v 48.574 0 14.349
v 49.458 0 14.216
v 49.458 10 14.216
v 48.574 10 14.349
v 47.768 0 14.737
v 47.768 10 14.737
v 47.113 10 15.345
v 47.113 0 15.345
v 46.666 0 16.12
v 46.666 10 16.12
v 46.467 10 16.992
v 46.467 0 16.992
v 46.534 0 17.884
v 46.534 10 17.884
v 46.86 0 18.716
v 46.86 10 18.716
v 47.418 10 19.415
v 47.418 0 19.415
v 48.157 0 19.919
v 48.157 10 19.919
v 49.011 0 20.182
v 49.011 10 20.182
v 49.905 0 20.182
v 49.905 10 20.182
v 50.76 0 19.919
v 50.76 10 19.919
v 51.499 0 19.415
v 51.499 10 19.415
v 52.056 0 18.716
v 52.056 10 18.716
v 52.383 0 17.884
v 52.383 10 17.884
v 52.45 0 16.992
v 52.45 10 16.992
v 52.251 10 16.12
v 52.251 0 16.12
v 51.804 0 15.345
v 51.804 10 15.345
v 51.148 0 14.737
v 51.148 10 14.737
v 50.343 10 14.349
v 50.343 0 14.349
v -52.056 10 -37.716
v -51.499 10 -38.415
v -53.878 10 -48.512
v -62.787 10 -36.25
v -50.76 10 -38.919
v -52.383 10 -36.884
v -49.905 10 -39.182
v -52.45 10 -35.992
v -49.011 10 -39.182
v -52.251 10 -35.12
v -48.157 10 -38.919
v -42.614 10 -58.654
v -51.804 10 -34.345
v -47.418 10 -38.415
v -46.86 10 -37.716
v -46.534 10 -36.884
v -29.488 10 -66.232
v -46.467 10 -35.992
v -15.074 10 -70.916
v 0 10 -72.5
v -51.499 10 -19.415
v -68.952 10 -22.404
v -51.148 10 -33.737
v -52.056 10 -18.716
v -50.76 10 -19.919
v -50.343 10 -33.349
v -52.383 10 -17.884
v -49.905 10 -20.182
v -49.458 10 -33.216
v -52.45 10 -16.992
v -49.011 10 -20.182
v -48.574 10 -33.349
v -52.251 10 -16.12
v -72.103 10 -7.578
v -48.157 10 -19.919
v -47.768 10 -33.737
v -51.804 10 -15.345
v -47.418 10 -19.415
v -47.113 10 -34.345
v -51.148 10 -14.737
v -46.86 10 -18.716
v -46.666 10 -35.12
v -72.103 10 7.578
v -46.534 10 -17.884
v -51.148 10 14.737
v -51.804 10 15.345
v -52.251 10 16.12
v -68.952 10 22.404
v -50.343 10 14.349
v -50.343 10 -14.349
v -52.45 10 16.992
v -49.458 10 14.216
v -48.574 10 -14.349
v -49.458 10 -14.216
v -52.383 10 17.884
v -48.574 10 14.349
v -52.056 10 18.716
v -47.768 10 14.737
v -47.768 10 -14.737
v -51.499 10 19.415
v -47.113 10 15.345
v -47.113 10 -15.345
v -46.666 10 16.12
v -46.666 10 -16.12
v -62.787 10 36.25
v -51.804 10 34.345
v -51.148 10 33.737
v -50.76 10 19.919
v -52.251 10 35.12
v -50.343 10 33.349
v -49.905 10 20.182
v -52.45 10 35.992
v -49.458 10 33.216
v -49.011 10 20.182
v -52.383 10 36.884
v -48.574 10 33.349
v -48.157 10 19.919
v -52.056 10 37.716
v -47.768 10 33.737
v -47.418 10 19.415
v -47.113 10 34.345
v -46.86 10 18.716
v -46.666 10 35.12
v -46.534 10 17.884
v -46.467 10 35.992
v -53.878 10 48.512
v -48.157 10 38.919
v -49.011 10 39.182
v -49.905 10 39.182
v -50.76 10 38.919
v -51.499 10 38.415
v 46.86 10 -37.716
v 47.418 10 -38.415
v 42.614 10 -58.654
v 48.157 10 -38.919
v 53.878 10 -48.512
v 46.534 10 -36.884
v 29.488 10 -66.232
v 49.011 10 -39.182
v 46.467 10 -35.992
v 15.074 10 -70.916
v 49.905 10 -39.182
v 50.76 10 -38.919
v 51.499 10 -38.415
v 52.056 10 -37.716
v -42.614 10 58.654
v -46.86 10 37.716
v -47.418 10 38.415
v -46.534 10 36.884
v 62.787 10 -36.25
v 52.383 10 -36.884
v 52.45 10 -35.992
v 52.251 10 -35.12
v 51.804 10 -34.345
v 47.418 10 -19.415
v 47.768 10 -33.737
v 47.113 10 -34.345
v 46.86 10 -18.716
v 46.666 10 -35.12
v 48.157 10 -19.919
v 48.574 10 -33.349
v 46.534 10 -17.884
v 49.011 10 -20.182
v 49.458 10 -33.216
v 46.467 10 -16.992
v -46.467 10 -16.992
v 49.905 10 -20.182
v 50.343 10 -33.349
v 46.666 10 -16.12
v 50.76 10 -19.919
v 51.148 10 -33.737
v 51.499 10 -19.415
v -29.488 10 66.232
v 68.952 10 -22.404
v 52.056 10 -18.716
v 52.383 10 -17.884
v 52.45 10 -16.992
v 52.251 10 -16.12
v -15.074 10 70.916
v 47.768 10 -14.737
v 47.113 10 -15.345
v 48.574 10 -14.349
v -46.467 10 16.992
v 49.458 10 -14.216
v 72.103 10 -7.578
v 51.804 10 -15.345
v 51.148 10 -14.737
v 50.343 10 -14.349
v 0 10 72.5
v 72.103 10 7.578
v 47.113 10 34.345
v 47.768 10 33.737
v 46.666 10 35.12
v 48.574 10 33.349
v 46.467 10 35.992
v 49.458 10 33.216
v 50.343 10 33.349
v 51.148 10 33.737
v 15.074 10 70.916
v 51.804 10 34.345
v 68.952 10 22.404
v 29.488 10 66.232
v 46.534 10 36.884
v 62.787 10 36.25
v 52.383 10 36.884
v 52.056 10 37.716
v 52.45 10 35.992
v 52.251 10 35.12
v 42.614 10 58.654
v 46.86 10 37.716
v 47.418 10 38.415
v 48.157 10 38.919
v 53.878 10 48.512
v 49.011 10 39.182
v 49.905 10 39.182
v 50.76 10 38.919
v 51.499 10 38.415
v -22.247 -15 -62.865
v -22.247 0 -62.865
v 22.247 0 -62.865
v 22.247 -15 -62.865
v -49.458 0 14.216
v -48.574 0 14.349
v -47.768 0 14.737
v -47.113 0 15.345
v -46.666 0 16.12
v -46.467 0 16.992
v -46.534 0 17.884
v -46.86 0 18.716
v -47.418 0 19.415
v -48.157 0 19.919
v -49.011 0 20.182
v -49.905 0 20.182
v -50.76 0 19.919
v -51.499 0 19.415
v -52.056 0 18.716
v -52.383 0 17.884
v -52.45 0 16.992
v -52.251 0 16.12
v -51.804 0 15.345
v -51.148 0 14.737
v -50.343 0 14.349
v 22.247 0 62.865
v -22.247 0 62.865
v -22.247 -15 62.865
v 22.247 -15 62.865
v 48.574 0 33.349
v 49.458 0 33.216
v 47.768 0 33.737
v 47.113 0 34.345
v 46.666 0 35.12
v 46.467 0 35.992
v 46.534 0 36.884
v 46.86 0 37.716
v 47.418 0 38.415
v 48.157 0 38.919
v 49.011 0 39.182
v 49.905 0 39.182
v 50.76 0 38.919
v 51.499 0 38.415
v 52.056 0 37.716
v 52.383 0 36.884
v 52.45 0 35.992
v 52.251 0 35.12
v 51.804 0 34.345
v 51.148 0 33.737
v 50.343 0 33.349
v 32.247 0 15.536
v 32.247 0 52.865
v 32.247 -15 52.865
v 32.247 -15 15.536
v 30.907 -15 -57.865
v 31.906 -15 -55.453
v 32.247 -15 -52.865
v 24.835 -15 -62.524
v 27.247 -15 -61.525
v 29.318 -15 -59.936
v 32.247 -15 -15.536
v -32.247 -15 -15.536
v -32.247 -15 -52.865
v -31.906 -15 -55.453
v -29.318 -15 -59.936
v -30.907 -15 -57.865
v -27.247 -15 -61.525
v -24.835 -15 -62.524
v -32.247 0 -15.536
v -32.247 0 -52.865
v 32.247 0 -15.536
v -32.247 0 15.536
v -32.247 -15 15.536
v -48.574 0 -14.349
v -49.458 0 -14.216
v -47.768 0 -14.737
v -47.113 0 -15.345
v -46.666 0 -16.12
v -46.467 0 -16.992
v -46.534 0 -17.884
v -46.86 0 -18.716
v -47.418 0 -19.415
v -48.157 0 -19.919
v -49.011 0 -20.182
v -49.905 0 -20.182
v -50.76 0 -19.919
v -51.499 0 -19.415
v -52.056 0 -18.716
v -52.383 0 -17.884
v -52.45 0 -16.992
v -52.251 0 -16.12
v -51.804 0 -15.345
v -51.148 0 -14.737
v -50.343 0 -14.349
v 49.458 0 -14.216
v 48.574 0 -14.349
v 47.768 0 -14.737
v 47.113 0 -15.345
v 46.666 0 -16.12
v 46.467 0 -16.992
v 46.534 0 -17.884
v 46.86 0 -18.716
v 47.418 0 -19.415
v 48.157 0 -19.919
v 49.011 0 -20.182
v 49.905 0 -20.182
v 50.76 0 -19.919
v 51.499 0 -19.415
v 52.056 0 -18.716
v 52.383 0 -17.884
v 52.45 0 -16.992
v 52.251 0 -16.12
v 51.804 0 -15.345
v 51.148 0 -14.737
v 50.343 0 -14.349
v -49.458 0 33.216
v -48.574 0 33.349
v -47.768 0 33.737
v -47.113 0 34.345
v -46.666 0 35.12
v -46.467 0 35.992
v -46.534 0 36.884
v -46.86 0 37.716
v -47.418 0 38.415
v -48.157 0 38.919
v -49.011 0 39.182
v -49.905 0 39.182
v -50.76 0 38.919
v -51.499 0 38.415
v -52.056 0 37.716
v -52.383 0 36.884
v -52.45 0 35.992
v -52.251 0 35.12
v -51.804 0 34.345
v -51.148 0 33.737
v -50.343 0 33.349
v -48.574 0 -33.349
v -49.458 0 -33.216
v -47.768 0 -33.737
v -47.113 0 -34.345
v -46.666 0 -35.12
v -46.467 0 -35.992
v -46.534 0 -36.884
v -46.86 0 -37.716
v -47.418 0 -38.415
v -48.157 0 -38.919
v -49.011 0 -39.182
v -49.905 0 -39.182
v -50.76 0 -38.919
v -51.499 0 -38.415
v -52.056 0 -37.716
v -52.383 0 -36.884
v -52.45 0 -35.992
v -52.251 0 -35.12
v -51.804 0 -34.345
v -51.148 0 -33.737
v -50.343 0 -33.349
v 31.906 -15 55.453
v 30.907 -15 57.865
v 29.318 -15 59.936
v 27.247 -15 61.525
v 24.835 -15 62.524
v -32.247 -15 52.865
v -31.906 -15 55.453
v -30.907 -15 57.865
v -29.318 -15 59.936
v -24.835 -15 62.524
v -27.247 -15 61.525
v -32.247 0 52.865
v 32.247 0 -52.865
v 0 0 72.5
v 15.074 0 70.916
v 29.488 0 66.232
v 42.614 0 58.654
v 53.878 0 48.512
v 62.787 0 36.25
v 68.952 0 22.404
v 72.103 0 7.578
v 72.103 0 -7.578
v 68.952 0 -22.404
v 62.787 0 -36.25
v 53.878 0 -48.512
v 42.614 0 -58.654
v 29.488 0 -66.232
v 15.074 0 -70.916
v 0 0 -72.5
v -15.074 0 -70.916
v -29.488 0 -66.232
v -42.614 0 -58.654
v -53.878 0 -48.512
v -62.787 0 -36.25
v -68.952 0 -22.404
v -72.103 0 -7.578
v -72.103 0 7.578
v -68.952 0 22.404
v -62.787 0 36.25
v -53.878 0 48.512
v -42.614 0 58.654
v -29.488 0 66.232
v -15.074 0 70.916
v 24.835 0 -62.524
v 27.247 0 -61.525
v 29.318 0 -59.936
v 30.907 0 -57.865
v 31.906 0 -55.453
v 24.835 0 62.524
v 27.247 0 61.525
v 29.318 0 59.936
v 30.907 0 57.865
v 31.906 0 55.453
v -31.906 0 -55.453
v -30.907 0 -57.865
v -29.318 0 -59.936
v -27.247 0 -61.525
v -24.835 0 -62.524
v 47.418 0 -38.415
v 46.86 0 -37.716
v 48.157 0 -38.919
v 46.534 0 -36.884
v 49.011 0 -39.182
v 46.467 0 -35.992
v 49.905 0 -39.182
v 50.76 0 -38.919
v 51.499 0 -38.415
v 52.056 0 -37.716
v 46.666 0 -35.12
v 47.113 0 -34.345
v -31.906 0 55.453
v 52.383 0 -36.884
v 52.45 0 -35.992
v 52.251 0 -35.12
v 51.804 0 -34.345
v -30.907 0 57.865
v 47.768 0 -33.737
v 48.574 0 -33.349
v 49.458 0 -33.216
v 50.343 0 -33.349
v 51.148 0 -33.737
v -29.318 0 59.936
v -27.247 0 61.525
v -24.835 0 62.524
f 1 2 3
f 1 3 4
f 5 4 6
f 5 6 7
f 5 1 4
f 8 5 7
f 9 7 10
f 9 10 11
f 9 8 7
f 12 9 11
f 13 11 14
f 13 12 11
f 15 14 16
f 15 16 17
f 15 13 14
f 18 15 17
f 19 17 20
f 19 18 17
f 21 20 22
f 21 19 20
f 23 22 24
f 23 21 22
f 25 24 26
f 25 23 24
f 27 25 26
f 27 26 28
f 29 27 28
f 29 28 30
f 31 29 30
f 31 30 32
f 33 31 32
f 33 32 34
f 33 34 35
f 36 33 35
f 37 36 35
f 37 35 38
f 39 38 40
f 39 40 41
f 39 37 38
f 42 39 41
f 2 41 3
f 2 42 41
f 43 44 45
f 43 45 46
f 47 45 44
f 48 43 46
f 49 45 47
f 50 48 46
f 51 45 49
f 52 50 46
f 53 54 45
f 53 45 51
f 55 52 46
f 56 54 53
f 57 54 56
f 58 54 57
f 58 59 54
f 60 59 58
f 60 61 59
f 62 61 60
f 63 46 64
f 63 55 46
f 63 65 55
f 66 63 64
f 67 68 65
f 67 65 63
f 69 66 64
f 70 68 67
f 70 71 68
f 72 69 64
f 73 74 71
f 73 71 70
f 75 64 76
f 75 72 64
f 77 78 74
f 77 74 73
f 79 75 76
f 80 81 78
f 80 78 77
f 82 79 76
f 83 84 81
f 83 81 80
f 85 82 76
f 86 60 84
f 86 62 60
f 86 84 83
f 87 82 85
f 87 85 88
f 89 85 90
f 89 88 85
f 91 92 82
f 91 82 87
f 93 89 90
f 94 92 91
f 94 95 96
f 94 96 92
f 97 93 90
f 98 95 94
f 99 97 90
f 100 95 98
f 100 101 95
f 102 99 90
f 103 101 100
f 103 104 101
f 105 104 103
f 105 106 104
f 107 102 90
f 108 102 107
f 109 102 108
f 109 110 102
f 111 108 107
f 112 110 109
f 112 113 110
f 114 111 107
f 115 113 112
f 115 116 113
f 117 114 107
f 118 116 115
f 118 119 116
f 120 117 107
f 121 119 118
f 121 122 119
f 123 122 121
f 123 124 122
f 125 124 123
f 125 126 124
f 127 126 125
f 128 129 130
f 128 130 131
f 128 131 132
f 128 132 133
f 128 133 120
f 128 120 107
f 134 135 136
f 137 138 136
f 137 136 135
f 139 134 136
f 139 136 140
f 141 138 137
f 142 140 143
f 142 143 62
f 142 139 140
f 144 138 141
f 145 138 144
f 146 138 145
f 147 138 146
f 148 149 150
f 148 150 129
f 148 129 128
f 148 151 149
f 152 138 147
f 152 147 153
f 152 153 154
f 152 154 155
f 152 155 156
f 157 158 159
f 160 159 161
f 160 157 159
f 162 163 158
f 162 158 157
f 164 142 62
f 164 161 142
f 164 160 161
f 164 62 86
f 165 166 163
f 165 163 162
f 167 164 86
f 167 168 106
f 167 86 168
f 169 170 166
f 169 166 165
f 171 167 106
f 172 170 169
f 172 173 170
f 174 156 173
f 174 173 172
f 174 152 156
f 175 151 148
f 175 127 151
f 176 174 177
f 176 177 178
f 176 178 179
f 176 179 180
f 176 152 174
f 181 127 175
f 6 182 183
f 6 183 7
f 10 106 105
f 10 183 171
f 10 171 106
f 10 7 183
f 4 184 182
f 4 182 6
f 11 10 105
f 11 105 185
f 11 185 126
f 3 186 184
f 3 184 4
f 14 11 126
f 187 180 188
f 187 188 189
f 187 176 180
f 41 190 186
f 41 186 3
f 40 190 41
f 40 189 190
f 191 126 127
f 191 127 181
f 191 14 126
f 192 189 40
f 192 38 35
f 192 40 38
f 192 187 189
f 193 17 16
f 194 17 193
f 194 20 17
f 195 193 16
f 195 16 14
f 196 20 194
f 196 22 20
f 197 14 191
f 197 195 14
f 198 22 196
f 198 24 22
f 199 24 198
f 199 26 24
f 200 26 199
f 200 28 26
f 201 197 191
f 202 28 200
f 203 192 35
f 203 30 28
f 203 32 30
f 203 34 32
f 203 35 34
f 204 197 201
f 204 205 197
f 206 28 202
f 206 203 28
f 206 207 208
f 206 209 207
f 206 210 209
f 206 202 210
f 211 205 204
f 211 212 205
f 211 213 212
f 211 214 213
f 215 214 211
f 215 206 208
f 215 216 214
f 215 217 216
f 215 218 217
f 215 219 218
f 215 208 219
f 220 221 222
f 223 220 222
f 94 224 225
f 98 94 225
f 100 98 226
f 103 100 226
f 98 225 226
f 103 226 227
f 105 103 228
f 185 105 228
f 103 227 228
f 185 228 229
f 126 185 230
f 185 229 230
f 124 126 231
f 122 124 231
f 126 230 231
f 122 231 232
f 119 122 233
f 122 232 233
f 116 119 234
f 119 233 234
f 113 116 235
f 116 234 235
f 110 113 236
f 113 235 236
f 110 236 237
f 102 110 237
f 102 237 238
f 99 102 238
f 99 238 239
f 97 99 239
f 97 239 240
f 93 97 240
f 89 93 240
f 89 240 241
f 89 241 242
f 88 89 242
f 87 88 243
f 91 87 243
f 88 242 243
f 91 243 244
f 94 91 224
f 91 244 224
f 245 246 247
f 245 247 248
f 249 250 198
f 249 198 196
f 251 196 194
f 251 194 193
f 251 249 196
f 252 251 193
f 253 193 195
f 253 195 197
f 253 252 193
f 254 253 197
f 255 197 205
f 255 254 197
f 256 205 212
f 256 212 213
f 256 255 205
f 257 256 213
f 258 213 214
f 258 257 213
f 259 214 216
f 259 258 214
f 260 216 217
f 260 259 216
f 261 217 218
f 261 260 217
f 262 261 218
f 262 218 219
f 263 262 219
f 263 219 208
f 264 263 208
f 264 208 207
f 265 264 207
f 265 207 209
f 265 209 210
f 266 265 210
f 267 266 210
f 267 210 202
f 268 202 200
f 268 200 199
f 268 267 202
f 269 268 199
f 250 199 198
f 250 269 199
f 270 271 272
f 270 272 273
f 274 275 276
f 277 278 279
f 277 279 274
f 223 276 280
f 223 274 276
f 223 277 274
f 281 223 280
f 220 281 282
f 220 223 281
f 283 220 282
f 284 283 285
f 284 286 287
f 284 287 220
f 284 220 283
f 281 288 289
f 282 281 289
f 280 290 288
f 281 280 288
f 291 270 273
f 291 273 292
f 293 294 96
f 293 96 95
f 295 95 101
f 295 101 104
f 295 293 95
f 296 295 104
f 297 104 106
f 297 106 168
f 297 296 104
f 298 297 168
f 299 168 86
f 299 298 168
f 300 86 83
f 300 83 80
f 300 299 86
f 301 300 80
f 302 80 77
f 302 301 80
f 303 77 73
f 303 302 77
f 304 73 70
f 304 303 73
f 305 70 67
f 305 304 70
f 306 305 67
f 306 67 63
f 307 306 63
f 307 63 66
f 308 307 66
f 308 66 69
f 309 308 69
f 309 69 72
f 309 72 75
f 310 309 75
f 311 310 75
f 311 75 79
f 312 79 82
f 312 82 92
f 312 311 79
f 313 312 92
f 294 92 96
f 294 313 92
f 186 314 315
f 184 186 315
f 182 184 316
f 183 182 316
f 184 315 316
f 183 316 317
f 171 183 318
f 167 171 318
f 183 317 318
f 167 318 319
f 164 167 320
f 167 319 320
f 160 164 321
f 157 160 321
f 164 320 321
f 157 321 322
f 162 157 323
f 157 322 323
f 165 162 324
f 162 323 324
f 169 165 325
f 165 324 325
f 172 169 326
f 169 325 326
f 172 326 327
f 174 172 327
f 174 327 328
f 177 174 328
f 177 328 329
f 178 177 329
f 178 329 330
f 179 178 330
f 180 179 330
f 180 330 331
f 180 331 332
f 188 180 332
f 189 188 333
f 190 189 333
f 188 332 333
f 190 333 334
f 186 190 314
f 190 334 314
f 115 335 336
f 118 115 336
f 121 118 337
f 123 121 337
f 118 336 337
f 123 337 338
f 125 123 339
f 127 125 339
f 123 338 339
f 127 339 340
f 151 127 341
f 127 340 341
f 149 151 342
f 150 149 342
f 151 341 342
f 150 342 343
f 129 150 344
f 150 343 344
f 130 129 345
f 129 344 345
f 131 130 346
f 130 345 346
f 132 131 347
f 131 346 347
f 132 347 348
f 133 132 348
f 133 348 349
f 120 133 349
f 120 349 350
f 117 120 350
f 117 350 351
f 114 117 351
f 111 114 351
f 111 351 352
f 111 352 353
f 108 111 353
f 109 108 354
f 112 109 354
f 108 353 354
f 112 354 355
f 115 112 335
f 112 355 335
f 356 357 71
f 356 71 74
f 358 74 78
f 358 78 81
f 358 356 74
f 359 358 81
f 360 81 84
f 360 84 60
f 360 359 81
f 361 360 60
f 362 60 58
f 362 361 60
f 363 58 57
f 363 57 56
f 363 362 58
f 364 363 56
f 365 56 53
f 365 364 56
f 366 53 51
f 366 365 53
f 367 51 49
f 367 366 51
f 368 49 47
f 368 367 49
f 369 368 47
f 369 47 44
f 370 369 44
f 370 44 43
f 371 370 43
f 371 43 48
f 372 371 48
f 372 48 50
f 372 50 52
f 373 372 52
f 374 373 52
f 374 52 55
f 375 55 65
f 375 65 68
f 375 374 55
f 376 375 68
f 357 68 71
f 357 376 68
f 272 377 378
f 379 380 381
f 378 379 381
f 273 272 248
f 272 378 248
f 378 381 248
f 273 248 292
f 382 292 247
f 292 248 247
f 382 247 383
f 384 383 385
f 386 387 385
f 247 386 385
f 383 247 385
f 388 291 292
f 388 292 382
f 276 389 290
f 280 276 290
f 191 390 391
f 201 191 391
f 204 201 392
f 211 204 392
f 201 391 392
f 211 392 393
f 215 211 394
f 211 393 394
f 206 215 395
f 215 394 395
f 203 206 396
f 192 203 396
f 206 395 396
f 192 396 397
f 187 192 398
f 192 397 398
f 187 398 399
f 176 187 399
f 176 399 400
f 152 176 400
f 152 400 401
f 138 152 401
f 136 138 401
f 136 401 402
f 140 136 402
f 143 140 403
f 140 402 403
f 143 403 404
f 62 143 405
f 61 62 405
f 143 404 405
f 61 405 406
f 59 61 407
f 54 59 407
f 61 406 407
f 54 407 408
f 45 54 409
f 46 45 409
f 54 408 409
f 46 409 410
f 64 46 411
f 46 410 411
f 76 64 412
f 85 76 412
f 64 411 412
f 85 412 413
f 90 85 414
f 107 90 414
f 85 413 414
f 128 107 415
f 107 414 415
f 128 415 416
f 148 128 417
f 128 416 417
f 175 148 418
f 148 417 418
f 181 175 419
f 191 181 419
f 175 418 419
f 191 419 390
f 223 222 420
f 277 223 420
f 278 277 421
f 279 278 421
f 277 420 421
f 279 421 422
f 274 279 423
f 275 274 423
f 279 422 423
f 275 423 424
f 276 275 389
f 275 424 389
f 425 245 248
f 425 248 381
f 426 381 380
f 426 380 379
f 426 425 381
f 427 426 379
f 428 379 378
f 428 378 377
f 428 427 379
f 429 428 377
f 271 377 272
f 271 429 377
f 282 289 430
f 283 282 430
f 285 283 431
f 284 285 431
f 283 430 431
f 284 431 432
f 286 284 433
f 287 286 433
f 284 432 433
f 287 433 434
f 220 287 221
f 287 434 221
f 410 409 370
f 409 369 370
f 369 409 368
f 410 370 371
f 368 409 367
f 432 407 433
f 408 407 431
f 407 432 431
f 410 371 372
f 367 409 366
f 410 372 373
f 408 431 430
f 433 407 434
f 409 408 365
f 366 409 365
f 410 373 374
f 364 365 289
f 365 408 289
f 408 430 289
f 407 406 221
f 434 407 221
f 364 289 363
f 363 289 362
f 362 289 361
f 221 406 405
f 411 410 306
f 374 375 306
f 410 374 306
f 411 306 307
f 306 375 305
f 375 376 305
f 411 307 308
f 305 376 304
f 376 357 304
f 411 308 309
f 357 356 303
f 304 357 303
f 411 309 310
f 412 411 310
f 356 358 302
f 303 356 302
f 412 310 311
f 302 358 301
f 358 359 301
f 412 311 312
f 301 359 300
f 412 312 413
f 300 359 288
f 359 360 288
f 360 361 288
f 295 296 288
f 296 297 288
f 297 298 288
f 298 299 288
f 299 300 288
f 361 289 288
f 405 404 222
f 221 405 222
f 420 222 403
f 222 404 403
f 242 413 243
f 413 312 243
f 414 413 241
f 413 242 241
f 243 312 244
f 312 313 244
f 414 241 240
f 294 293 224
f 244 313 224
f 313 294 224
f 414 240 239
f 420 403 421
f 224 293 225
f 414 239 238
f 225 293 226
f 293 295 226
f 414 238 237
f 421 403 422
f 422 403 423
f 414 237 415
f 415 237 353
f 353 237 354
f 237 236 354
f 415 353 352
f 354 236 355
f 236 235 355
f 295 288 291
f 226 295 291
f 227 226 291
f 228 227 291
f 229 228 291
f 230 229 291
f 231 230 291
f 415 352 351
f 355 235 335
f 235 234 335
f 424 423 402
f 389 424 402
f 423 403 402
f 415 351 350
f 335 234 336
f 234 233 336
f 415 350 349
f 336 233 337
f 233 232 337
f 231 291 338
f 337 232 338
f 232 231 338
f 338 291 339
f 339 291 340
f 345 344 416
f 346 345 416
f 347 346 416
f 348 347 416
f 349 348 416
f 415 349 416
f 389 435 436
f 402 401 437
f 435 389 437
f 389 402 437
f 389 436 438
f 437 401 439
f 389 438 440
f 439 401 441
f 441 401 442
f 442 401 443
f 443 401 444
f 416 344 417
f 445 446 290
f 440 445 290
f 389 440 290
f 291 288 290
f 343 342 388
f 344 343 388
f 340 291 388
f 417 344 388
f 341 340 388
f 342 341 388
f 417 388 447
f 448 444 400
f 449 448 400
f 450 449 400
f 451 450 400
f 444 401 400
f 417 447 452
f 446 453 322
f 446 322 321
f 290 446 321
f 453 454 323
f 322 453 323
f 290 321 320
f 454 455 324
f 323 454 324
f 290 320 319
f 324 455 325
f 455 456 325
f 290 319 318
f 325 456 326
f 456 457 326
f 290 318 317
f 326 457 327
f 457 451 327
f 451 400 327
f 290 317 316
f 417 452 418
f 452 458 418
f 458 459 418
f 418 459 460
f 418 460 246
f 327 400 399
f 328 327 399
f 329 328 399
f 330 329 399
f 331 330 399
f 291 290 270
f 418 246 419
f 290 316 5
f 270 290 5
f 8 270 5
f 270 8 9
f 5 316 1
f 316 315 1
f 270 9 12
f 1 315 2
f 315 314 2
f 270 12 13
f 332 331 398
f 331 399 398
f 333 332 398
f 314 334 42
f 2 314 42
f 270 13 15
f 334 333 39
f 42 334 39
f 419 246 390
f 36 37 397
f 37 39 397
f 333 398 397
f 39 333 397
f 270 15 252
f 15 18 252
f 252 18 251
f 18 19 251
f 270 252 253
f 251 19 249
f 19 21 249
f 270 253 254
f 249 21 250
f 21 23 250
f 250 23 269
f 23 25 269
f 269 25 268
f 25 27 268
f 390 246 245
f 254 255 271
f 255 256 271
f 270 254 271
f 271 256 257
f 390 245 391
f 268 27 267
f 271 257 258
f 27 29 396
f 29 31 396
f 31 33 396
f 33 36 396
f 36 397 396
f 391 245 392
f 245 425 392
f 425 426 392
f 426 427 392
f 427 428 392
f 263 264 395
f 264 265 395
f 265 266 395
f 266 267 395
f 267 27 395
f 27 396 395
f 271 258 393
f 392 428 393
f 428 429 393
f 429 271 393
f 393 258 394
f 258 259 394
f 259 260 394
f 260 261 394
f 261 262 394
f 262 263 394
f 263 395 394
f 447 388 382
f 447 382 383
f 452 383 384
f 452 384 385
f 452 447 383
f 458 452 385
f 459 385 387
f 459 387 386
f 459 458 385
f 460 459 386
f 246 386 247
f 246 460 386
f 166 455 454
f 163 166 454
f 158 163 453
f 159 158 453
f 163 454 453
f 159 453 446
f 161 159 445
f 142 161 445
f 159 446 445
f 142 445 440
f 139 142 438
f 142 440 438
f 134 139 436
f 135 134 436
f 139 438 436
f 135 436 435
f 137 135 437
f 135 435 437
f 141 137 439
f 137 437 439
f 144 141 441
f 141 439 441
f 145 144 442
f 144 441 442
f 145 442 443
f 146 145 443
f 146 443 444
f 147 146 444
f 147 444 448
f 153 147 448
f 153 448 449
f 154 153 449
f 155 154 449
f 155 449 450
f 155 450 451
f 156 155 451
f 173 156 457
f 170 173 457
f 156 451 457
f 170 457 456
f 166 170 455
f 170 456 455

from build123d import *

# Parameters (mm, degrees)
SKETCH1_R               = 72.5
BOSS_EXTRUDE1_DEPTH     = 10
BOSS_EXTRUDE2_DEPTH     = 15
SKETCH3_R               = 3
CUT_EXTRUDE1_DEPTH      = 10
MIRROR3_COPY_1_SKETCH_R = 3
MIRROR3_COPY_1_DEPTH    = 10


with BuildPart() as part:
    # Sketch1 → Boss-Extrude1 (new body)
    with BuildSketch(Plane(origin=(0, 0, 0), x_dir=(1, 0, 0), z_dir=(0, 1, 0))):
        with Locations(Location((0, 0, 0), (0, 0, 270))):
            Circle(SKETCH1_R)
    extrude(amount=BOSS_EXTRUDE1_DEPTH)

    # Sketch2 → Boss-Extrude2 (add)
    with BuildSketch(Plane.XZ):
        with BuildLine():
            Line((-22.246900451, 62.865113828), (22.246900451, 62.865113828))
            ThreePointArc((22.246900451, 62.865113828), (29.317968263, 59.93618164), (32.246900451, 52.865113828))
            Line((32.246900451, 52.865113828), (32.246900451, 15.536222894))
            Line((32.246900451, 15.536222894), (-32.246900451, 15.536222894))
            Line((-32.246900451, 15.536222894), (-32.246900451, 52.865113828))
            ThreePointArc((-32.246900451, 52.865113828), (-29.317968263, 59.93618164), (-22.246900451, 62.865113828))
        make_face()
    boss_extrude2 = extrude(amount=BOSS_EXTRUDE2_DEPTH)

    # Mirror1: Boss-Extrude2 across plane
    add(boss_extrude2.mirror(Plane.XY))

    # Sketch3 → Cut-Extrude1 (cut)
    with BuildSketch(Plane.XZ):
        with Locations(Location((-49.458347743, 36.215950375, 0), (0, 0, 270))):
            Circle(SKETCH3_R)
        with Locations(Location((-49.458347743, 17.215950375, 0), (0, 0, 270))):
            Circle(SKETCH3_R)
    cut_extrude1 = extrude(amount=-CUT_EXTRUDE1_DEPTH, mode=Mode.SUBTRACT)

    # Mirror2: Cut-Extrude1 across plane
    add(cut_extrude1.mirror(Plane.XY), mode=Mode.SUBTRACT)

    # Mirror3: Cut-Extrude1 across plane
    add(cut_extrude1.mirror(Plane(origin=(0, 0, 0), x_dir=(0, 0, 1), z_dir=(1, 0, 0))), mode=Mode.SUBTRACT)

    # Mirror3 copy 1 sketch → Mirror3 copy 1 (cut)
    with BuildSketch(Plane(origin=(0, 0, 0), x_dir=(-1, 0, 0), z_dir=(0, -1, 0))):
        with Locations(Location((-49.458347743, 36.215950375, 0), (0, 0, 270))):
            Circle(MIRROR3_COPY_1_SKETCH_R)
        with Locations(Location((-49.458347743, 17.215950375, 0), (0, 0, 270))):
            Circle(MIRROR3_COPY_1_SKETCH_R)
    extrude(amount=-MIRROR3_COPY_1_DEPTH, mode=Mode.SUBTRACT)


solid = part.part
